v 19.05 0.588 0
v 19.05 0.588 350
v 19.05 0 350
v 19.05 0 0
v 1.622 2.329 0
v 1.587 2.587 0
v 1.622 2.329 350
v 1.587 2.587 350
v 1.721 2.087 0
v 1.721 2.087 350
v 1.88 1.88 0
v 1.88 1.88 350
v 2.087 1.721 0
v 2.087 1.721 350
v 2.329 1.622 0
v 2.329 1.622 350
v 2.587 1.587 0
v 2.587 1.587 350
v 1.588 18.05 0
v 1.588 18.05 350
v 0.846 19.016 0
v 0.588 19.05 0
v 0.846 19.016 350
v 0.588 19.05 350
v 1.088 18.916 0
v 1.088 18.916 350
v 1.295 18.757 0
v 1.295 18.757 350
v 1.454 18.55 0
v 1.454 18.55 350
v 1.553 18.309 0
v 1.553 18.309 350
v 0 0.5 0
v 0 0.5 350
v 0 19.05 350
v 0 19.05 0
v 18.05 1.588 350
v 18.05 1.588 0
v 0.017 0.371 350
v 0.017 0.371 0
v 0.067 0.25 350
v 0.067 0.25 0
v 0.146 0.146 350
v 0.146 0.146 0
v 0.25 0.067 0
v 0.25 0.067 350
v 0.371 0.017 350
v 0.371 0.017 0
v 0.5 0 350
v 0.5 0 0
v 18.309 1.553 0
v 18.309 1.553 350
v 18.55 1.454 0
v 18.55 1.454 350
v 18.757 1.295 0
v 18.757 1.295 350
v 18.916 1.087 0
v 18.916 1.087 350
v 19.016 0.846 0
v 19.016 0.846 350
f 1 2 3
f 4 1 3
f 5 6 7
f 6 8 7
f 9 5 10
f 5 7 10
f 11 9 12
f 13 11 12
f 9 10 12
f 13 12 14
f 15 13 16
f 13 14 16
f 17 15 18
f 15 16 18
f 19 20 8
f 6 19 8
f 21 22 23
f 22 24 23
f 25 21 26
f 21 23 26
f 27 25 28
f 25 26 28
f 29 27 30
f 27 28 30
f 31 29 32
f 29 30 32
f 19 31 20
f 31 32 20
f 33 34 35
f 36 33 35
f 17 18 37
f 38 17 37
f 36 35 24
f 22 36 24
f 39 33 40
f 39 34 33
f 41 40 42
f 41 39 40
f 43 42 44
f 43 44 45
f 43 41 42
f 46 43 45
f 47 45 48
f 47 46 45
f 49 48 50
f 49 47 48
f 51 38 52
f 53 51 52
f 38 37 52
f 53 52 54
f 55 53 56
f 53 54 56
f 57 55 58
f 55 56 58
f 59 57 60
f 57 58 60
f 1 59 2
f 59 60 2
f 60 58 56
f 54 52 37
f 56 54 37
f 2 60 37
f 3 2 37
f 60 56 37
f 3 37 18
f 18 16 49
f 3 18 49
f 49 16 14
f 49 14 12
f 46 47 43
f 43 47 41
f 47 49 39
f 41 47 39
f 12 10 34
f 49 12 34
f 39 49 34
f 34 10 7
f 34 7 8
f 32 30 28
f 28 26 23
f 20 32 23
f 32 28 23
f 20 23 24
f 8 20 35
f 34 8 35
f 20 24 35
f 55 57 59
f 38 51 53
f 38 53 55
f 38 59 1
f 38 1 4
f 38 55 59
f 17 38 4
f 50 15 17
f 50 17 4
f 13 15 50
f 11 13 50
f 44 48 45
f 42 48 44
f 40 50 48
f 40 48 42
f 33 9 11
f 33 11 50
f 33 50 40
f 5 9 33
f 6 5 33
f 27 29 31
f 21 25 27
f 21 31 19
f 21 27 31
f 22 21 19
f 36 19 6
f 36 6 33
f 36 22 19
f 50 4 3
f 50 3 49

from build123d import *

# Parameters (mm, degrees)
BOSS_EXTRUDE1_DEPTH = 350
FILLET1_R           = 1
FILLET2_R           = 0.5


with BuildPart() as part:
    # Sketch1 → Boss-Extrude1 (new body)
    with BuildSketch(Plane.XY):
        Polygon((0, 0), (0, 19.05), (1.5875, 19.05), (1.5875, 1.5875), (19.05, 1.5875), (19.05, 0), align=None)
    extrude(amount=BOSS_EXTRUDE1_DEPTH)

    # Fillet1
    fillet1_edges = [part.edges().sort_by_distance(p)[0] for p in [
        (1.5875, 19.05, 175),
        (1.5875, 1.5875, 175),
        (19.05, 1.5875, 175),
    ]]
    fillet(fillet1_edges, radius=FILLET1_R)

    # Fillet2
    fillet2_edges = [part.edges().sort_by_distance(p)[0] for p in [
        (0, 0, 175),
    ]]
    fillet(fillet2_edges, radius=FILLET2_R)


solid = part.part
